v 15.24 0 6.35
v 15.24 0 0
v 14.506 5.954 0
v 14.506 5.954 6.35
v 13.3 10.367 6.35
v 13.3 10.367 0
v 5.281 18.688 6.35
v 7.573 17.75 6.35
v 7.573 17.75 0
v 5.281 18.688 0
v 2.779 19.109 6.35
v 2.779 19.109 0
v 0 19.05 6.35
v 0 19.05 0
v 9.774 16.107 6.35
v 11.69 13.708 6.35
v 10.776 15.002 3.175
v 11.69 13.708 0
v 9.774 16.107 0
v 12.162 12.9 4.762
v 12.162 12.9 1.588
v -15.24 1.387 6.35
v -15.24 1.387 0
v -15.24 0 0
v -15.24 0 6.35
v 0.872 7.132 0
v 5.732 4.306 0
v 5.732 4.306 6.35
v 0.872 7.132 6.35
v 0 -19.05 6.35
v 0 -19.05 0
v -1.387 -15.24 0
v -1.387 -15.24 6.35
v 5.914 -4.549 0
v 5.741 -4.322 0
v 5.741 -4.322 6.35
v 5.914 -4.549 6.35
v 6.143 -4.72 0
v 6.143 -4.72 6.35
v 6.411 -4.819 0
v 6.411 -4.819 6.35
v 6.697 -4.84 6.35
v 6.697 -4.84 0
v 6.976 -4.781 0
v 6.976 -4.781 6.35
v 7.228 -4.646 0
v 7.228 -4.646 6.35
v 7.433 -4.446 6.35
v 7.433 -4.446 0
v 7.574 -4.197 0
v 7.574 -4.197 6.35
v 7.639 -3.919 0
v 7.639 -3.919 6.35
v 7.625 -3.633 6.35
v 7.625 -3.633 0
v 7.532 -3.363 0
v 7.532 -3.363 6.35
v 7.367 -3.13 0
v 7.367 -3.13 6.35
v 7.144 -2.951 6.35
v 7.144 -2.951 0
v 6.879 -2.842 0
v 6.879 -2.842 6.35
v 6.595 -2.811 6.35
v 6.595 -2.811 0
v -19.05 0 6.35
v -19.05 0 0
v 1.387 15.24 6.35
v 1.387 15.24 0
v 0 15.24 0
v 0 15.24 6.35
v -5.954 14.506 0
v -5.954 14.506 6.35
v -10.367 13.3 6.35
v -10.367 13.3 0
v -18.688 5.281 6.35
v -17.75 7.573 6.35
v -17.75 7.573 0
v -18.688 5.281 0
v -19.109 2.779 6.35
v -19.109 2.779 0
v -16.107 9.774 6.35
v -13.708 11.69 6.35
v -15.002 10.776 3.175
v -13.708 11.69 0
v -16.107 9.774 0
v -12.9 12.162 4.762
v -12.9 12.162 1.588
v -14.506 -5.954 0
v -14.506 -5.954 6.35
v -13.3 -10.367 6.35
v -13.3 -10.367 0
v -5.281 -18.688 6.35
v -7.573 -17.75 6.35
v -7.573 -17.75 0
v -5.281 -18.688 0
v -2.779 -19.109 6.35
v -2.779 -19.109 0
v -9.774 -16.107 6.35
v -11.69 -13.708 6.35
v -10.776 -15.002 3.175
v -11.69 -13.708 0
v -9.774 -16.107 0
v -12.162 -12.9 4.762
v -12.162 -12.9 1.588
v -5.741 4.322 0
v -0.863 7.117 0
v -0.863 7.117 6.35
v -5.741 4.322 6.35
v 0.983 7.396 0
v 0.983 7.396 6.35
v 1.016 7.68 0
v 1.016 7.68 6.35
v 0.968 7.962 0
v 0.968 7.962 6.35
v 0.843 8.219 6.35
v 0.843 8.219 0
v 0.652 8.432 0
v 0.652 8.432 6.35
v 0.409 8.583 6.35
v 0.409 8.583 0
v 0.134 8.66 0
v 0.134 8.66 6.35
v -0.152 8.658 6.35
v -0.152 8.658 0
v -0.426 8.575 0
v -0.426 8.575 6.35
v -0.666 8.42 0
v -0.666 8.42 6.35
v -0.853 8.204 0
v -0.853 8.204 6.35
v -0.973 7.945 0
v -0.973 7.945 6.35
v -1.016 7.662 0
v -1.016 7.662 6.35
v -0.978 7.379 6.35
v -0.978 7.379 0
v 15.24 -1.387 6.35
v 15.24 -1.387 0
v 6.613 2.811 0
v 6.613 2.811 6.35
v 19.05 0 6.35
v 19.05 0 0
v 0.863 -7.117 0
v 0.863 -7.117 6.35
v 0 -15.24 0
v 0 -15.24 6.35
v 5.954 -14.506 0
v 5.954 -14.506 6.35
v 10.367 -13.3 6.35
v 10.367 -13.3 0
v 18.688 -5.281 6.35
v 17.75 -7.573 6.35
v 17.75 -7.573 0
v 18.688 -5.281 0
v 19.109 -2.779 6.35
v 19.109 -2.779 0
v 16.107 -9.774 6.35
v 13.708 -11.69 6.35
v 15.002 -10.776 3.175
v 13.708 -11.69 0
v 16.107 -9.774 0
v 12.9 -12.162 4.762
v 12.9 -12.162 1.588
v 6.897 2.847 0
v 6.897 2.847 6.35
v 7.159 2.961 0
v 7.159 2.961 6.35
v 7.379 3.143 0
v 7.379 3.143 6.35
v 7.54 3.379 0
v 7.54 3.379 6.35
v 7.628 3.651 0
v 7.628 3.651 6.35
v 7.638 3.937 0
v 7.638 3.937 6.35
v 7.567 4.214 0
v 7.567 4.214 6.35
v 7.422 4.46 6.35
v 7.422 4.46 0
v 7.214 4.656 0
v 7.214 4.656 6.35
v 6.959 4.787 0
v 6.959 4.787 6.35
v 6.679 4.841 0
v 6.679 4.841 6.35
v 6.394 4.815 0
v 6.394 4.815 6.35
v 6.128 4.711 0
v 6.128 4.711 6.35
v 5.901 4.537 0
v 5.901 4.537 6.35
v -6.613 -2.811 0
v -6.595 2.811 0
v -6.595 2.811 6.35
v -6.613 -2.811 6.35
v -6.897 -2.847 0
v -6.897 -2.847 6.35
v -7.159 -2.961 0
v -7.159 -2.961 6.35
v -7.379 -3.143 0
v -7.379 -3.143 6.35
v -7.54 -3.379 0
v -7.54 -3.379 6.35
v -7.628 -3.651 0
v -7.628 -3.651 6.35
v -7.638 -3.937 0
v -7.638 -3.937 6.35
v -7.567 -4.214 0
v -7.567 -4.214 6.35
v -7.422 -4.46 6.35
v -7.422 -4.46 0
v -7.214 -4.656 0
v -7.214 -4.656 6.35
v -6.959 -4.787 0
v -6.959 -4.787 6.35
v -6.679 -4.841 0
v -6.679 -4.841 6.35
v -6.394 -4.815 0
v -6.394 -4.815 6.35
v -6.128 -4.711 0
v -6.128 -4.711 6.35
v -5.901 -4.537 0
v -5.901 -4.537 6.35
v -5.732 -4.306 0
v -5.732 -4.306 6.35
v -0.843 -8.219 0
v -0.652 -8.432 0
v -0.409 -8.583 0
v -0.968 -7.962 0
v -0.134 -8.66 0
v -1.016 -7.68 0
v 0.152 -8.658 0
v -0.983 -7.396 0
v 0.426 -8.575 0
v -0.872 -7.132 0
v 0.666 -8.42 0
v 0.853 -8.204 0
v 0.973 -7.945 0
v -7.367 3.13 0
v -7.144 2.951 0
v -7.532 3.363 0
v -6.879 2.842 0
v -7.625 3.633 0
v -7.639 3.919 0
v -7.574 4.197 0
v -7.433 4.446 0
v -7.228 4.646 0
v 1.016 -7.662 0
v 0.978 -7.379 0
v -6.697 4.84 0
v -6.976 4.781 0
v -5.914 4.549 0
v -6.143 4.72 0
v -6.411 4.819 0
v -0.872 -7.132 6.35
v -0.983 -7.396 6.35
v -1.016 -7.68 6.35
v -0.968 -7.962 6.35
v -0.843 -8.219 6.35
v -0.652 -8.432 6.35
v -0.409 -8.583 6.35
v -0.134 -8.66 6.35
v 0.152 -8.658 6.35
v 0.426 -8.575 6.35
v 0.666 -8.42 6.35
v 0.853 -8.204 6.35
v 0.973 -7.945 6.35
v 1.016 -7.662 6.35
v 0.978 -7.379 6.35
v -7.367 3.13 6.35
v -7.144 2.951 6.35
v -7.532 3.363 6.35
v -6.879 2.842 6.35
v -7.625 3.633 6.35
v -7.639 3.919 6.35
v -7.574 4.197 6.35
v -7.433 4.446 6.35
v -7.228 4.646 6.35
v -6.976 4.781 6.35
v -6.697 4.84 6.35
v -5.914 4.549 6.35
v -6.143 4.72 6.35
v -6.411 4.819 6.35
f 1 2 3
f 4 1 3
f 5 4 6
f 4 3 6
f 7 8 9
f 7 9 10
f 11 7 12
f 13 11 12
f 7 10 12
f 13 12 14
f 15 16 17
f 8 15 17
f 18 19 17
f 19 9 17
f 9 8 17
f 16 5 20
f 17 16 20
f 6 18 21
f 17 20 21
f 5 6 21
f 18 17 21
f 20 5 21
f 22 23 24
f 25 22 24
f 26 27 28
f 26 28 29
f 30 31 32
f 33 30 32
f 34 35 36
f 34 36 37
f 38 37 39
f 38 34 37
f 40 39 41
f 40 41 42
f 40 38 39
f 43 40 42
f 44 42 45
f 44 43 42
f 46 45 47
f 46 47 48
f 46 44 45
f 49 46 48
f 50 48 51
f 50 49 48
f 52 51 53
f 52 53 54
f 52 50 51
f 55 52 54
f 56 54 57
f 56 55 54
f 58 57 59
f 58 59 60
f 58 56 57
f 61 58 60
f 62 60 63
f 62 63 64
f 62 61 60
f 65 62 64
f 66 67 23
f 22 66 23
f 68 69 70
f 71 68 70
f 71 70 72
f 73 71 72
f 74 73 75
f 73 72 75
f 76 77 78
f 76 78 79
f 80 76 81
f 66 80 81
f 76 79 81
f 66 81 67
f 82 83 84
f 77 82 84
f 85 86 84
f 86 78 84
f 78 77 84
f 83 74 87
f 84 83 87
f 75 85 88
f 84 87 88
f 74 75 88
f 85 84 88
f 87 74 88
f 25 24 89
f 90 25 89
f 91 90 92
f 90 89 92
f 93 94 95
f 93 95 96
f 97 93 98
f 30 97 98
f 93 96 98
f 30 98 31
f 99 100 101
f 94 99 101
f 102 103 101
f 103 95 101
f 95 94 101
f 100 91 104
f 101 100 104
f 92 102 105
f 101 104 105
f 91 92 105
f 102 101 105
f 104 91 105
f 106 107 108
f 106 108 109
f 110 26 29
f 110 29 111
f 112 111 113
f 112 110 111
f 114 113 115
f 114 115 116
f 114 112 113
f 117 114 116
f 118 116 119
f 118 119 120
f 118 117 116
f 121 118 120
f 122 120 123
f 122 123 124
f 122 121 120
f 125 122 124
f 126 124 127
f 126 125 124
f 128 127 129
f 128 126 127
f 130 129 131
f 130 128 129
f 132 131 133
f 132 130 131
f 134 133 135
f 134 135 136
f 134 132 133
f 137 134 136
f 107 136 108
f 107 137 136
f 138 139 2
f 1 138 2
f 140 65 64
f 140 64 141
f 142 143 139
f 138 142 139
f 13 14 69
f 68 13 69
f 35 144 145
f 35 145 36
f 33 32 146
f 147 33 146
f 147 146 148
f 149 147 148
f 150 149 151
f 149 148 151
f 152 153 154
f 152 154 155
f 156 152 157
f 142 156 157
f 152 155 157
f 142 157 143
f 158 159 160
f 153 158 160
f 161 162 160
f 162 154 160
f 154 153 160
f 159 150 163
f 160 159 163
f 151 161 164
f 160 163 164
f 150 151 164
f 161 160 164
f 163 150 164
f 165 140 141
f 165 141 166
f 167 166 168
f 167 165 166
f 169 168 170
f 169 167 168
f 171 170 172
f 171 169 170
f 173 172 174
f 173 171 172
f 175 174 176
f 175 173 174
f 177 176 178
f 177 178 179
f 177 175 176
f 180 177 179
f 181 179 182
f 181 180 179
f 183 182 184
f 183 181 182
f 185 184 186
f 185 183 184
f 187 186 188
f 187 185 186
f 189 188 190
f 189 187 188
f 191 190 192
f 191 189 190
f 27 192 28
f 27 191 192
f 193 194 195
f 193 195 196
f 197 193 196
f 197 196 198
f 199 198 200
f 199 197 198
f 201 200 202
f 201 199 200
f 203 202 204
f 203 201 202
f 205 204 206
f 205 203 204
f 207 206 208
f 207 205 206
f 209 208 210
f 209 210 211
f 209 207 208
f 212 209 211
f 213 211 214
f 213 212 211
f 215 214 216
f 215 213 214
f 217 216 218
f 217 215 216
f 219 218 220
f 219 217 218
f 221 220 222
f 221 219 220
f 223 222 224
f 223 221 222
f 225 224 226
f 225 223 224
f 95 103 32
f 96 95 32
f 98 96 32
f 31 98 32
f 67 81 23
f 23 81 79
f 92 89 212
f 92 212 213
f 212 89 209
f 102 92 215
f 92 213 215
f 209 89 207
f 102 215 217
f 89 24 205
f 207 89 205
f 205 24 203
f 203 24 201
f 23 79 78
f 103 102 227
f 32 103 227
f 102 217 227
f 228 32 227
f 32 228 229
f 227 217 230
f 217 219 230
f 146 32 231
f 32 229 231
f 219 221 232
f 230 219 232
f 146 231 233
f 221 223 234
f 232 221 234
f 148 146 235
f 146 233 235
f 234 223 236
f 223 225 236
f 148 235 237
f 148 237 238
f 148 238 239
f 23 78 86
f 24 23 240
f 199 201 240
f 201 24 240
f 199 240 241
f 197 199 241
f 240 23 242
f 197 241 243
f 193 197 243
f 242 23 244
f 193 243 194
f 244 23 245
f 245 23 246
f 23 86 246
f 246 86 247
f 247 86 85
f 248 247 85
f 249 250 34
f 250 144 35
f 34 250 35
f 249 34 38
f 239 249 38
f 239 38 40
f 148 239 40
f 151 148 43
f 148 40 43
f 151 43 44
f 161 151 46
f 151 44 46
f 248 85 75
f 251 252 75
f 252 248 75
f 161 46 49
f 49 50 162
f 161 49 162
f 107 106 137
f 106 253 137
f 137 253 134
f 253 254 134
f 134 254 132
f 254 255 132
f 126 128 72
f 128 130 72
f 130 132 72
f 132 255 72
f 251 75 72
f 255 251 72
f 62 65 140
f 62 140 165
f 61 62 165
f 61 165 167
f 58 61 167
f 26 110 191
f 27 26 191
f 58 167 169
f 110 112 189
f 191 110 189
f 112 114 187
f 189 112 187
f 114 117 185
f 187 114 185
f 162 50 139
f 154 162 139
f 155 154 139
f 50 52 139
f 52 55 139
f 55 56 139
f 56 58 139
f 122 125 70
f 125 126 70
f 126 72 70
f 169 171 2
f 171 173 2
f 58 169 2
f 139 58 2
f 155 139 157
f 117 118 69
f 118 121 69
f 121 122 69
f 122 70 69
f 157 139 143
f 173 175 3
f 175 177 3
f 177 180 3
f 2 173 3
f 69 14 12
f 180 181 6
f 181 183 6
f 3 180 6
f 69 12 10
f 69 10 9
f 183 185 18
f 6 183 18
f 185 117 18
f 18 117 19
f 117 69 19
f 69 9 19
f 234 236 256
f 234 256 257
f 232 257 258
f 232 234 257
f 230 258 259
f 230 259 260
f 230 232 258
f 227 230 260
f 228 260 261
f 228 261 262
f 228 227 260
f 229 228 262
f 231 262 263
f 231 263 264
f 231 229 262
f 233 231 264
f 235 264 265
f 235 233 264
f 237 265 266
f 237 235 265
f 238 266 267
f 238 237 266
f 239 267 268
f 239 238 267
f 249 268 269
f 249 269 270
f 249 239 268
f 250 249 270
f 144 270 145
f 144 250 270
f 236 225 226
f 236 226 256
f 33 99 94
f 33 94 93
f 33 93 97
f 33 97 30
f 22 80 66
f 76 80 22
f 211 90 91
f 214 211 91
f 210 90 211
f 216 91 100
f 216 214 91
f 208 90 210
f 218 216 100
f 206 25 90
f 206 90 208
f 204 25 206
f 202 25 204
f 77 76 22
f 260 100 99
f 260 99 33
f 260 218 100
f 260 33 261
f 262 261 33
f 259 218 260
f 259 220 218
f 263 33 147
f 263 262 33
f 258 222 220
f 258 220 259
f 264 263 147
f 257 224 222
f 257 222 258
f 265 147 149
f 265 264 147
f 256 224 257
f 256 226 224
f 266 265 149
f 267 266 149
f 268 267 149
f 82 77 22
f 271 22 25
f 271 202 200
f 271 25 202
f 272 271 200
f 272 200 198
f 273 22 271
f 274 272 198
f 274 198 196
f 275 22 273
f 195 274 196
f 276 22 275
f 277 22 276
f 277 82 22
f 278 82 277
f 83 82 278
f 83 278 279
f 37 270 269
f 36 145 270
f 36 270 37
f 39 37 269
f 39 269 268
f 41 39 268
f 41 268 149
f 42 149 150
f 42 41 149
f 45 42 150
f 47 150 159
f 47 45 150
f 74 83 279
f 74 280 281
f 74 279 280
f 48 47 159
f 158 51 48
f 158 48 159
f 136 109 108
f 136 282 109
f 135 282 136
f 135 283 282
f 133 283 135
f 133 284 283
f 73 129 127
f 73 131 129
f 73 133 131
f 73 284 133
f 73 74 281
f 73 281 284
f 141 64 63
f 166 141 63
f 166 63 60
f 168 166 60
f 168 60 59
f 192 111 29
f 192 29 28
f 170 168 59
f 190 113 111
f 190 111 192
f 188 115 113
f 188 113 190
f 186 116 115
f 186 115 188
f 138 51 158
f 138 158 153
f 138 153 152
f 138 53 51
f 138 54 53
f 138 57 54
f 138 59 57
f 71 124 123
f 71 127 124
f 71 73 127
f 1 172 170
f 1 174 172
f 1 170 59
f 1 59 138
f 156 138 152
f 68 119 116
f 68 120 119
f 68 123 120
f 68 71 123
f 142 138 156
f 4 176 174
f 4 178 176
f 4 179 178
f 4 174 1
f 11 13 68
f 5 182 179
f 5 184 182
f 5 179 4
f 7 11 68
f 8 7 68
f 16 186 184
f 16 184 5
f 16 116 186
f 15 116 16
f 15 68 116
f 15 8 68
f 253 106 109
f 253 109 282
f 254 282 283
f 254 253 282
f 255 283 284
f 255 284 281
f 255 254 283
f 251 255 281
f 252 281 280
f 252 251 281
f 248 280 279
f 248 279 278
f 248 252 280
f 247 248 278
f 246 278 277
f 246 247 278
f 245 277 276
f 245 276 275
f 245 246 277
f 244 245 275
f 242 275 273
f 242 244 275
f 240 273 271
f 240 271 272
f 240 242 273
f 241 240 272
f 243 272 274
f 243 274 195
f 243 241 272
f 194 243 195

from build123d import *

# Parameters (mm, degrees)
BOSS_EXTRUDE2_DEPTH = 6.35


with BuildPart() as part:
    # Sketch1 → Boss-Extrude2 (new body)
    with BuildSketch(Plane.XY):
        with BuildLine():
            Line((-19.05, 0), (-15.24, 1.386726593))
            Line((-15.24, 1.386726593), (-15.24, 0))
            add(Edge.make_bspline(
                [(-15.24, 0), (-13.932101613, -20.478619227), (0, -19.05)],
                knots=[0, 0, 0, 0.635745988, 0.635745988, 0.635745988], degree=2))
            Line((0, -19.05), (-1.386726593, -15.24))
            Line((-1.386726593, -15.24), (0, -15.24))
            add(Edge.make_bspline(
                [(0, -15.24), (20.478619227, -13.932101613), (19.05, 0)],
                knots=[0, 0, 0, 0.635745988, 0.635745988, 0.635745988], degree=2))
            Line((19.05, 0), (15.24, -1.386726593))
            Line((15.24, -1.386726593), (15.24, 0))
            add(Edge.make_bspline(
                [(15.24, 0), (13.932101613, 20.478619227), (0, 19.05)],
                knots=[0, 0, 0, 0.635745988, 0.635745988, 0.635745988], degree=2))
            Line((0, 19.05), (1.386726593, 15.24))
            Line((1.386726593, 15.24), (0, 15.24))
            add(Edge.make_bspline(
                [(0, 15.24), (-20.478619227, 13.932101613), (-19.05, 0)],
                knots=[0, 0, 0, 0.635745988, 0.635745988, 0.635745988], degree=2))
        make_face()
        with BuildLine():
            Line((6.594985068, -2.811017562), (6.613082013, 2.810596285))
            ThreePointArc((6.613082013, 2.810596285), (7.502999025, 4.342309614), (5.731905154, 4.305915826))
            Line((5.731905154, 4.305915826), (0.872493224, 7.132395163))
            ThreePointArc((0.872493224, 7.132395163), (-0.009050924, 8.668942567), (-0.863079915, 7.116933388))
            Line((-0.863079915, 7.116933388), (-5.740588789, 4.321798878))
            ThreePointArc((-5.740588789, 4.321798878), (-7.512049949, 4.326632954), (-6.594985068, 2.811017562))
            Line((-6.594985068, 2.811017562), (-6.613082013, -2.810596285))
            ThreePointArc((-6.613082013, -2.810596285), (-7.502999025, -4.342309614), (-5.731905154, -4.305915826))
            Line((-5.731905154, -4.305915826), (-0.872493224, -7.132395163))
            ThreePointArc((-0.872493224, -7.132395163), (0.009050924, -8.668942567), (0.863079915, -7.116933388))
            Line((0.863079915, -7.116933388), (5.740588789, -4.321798878))
            ThreePointArc((5.740588789, -4.321798878), (7.512049949, -4.326632954), (6.594985068, -2.811017562))
        make_face(mode=Mode.SUBTRACT)
    extrude(amount=BOSS_EXTRUDE2_DEPTH)


solid = part.part
